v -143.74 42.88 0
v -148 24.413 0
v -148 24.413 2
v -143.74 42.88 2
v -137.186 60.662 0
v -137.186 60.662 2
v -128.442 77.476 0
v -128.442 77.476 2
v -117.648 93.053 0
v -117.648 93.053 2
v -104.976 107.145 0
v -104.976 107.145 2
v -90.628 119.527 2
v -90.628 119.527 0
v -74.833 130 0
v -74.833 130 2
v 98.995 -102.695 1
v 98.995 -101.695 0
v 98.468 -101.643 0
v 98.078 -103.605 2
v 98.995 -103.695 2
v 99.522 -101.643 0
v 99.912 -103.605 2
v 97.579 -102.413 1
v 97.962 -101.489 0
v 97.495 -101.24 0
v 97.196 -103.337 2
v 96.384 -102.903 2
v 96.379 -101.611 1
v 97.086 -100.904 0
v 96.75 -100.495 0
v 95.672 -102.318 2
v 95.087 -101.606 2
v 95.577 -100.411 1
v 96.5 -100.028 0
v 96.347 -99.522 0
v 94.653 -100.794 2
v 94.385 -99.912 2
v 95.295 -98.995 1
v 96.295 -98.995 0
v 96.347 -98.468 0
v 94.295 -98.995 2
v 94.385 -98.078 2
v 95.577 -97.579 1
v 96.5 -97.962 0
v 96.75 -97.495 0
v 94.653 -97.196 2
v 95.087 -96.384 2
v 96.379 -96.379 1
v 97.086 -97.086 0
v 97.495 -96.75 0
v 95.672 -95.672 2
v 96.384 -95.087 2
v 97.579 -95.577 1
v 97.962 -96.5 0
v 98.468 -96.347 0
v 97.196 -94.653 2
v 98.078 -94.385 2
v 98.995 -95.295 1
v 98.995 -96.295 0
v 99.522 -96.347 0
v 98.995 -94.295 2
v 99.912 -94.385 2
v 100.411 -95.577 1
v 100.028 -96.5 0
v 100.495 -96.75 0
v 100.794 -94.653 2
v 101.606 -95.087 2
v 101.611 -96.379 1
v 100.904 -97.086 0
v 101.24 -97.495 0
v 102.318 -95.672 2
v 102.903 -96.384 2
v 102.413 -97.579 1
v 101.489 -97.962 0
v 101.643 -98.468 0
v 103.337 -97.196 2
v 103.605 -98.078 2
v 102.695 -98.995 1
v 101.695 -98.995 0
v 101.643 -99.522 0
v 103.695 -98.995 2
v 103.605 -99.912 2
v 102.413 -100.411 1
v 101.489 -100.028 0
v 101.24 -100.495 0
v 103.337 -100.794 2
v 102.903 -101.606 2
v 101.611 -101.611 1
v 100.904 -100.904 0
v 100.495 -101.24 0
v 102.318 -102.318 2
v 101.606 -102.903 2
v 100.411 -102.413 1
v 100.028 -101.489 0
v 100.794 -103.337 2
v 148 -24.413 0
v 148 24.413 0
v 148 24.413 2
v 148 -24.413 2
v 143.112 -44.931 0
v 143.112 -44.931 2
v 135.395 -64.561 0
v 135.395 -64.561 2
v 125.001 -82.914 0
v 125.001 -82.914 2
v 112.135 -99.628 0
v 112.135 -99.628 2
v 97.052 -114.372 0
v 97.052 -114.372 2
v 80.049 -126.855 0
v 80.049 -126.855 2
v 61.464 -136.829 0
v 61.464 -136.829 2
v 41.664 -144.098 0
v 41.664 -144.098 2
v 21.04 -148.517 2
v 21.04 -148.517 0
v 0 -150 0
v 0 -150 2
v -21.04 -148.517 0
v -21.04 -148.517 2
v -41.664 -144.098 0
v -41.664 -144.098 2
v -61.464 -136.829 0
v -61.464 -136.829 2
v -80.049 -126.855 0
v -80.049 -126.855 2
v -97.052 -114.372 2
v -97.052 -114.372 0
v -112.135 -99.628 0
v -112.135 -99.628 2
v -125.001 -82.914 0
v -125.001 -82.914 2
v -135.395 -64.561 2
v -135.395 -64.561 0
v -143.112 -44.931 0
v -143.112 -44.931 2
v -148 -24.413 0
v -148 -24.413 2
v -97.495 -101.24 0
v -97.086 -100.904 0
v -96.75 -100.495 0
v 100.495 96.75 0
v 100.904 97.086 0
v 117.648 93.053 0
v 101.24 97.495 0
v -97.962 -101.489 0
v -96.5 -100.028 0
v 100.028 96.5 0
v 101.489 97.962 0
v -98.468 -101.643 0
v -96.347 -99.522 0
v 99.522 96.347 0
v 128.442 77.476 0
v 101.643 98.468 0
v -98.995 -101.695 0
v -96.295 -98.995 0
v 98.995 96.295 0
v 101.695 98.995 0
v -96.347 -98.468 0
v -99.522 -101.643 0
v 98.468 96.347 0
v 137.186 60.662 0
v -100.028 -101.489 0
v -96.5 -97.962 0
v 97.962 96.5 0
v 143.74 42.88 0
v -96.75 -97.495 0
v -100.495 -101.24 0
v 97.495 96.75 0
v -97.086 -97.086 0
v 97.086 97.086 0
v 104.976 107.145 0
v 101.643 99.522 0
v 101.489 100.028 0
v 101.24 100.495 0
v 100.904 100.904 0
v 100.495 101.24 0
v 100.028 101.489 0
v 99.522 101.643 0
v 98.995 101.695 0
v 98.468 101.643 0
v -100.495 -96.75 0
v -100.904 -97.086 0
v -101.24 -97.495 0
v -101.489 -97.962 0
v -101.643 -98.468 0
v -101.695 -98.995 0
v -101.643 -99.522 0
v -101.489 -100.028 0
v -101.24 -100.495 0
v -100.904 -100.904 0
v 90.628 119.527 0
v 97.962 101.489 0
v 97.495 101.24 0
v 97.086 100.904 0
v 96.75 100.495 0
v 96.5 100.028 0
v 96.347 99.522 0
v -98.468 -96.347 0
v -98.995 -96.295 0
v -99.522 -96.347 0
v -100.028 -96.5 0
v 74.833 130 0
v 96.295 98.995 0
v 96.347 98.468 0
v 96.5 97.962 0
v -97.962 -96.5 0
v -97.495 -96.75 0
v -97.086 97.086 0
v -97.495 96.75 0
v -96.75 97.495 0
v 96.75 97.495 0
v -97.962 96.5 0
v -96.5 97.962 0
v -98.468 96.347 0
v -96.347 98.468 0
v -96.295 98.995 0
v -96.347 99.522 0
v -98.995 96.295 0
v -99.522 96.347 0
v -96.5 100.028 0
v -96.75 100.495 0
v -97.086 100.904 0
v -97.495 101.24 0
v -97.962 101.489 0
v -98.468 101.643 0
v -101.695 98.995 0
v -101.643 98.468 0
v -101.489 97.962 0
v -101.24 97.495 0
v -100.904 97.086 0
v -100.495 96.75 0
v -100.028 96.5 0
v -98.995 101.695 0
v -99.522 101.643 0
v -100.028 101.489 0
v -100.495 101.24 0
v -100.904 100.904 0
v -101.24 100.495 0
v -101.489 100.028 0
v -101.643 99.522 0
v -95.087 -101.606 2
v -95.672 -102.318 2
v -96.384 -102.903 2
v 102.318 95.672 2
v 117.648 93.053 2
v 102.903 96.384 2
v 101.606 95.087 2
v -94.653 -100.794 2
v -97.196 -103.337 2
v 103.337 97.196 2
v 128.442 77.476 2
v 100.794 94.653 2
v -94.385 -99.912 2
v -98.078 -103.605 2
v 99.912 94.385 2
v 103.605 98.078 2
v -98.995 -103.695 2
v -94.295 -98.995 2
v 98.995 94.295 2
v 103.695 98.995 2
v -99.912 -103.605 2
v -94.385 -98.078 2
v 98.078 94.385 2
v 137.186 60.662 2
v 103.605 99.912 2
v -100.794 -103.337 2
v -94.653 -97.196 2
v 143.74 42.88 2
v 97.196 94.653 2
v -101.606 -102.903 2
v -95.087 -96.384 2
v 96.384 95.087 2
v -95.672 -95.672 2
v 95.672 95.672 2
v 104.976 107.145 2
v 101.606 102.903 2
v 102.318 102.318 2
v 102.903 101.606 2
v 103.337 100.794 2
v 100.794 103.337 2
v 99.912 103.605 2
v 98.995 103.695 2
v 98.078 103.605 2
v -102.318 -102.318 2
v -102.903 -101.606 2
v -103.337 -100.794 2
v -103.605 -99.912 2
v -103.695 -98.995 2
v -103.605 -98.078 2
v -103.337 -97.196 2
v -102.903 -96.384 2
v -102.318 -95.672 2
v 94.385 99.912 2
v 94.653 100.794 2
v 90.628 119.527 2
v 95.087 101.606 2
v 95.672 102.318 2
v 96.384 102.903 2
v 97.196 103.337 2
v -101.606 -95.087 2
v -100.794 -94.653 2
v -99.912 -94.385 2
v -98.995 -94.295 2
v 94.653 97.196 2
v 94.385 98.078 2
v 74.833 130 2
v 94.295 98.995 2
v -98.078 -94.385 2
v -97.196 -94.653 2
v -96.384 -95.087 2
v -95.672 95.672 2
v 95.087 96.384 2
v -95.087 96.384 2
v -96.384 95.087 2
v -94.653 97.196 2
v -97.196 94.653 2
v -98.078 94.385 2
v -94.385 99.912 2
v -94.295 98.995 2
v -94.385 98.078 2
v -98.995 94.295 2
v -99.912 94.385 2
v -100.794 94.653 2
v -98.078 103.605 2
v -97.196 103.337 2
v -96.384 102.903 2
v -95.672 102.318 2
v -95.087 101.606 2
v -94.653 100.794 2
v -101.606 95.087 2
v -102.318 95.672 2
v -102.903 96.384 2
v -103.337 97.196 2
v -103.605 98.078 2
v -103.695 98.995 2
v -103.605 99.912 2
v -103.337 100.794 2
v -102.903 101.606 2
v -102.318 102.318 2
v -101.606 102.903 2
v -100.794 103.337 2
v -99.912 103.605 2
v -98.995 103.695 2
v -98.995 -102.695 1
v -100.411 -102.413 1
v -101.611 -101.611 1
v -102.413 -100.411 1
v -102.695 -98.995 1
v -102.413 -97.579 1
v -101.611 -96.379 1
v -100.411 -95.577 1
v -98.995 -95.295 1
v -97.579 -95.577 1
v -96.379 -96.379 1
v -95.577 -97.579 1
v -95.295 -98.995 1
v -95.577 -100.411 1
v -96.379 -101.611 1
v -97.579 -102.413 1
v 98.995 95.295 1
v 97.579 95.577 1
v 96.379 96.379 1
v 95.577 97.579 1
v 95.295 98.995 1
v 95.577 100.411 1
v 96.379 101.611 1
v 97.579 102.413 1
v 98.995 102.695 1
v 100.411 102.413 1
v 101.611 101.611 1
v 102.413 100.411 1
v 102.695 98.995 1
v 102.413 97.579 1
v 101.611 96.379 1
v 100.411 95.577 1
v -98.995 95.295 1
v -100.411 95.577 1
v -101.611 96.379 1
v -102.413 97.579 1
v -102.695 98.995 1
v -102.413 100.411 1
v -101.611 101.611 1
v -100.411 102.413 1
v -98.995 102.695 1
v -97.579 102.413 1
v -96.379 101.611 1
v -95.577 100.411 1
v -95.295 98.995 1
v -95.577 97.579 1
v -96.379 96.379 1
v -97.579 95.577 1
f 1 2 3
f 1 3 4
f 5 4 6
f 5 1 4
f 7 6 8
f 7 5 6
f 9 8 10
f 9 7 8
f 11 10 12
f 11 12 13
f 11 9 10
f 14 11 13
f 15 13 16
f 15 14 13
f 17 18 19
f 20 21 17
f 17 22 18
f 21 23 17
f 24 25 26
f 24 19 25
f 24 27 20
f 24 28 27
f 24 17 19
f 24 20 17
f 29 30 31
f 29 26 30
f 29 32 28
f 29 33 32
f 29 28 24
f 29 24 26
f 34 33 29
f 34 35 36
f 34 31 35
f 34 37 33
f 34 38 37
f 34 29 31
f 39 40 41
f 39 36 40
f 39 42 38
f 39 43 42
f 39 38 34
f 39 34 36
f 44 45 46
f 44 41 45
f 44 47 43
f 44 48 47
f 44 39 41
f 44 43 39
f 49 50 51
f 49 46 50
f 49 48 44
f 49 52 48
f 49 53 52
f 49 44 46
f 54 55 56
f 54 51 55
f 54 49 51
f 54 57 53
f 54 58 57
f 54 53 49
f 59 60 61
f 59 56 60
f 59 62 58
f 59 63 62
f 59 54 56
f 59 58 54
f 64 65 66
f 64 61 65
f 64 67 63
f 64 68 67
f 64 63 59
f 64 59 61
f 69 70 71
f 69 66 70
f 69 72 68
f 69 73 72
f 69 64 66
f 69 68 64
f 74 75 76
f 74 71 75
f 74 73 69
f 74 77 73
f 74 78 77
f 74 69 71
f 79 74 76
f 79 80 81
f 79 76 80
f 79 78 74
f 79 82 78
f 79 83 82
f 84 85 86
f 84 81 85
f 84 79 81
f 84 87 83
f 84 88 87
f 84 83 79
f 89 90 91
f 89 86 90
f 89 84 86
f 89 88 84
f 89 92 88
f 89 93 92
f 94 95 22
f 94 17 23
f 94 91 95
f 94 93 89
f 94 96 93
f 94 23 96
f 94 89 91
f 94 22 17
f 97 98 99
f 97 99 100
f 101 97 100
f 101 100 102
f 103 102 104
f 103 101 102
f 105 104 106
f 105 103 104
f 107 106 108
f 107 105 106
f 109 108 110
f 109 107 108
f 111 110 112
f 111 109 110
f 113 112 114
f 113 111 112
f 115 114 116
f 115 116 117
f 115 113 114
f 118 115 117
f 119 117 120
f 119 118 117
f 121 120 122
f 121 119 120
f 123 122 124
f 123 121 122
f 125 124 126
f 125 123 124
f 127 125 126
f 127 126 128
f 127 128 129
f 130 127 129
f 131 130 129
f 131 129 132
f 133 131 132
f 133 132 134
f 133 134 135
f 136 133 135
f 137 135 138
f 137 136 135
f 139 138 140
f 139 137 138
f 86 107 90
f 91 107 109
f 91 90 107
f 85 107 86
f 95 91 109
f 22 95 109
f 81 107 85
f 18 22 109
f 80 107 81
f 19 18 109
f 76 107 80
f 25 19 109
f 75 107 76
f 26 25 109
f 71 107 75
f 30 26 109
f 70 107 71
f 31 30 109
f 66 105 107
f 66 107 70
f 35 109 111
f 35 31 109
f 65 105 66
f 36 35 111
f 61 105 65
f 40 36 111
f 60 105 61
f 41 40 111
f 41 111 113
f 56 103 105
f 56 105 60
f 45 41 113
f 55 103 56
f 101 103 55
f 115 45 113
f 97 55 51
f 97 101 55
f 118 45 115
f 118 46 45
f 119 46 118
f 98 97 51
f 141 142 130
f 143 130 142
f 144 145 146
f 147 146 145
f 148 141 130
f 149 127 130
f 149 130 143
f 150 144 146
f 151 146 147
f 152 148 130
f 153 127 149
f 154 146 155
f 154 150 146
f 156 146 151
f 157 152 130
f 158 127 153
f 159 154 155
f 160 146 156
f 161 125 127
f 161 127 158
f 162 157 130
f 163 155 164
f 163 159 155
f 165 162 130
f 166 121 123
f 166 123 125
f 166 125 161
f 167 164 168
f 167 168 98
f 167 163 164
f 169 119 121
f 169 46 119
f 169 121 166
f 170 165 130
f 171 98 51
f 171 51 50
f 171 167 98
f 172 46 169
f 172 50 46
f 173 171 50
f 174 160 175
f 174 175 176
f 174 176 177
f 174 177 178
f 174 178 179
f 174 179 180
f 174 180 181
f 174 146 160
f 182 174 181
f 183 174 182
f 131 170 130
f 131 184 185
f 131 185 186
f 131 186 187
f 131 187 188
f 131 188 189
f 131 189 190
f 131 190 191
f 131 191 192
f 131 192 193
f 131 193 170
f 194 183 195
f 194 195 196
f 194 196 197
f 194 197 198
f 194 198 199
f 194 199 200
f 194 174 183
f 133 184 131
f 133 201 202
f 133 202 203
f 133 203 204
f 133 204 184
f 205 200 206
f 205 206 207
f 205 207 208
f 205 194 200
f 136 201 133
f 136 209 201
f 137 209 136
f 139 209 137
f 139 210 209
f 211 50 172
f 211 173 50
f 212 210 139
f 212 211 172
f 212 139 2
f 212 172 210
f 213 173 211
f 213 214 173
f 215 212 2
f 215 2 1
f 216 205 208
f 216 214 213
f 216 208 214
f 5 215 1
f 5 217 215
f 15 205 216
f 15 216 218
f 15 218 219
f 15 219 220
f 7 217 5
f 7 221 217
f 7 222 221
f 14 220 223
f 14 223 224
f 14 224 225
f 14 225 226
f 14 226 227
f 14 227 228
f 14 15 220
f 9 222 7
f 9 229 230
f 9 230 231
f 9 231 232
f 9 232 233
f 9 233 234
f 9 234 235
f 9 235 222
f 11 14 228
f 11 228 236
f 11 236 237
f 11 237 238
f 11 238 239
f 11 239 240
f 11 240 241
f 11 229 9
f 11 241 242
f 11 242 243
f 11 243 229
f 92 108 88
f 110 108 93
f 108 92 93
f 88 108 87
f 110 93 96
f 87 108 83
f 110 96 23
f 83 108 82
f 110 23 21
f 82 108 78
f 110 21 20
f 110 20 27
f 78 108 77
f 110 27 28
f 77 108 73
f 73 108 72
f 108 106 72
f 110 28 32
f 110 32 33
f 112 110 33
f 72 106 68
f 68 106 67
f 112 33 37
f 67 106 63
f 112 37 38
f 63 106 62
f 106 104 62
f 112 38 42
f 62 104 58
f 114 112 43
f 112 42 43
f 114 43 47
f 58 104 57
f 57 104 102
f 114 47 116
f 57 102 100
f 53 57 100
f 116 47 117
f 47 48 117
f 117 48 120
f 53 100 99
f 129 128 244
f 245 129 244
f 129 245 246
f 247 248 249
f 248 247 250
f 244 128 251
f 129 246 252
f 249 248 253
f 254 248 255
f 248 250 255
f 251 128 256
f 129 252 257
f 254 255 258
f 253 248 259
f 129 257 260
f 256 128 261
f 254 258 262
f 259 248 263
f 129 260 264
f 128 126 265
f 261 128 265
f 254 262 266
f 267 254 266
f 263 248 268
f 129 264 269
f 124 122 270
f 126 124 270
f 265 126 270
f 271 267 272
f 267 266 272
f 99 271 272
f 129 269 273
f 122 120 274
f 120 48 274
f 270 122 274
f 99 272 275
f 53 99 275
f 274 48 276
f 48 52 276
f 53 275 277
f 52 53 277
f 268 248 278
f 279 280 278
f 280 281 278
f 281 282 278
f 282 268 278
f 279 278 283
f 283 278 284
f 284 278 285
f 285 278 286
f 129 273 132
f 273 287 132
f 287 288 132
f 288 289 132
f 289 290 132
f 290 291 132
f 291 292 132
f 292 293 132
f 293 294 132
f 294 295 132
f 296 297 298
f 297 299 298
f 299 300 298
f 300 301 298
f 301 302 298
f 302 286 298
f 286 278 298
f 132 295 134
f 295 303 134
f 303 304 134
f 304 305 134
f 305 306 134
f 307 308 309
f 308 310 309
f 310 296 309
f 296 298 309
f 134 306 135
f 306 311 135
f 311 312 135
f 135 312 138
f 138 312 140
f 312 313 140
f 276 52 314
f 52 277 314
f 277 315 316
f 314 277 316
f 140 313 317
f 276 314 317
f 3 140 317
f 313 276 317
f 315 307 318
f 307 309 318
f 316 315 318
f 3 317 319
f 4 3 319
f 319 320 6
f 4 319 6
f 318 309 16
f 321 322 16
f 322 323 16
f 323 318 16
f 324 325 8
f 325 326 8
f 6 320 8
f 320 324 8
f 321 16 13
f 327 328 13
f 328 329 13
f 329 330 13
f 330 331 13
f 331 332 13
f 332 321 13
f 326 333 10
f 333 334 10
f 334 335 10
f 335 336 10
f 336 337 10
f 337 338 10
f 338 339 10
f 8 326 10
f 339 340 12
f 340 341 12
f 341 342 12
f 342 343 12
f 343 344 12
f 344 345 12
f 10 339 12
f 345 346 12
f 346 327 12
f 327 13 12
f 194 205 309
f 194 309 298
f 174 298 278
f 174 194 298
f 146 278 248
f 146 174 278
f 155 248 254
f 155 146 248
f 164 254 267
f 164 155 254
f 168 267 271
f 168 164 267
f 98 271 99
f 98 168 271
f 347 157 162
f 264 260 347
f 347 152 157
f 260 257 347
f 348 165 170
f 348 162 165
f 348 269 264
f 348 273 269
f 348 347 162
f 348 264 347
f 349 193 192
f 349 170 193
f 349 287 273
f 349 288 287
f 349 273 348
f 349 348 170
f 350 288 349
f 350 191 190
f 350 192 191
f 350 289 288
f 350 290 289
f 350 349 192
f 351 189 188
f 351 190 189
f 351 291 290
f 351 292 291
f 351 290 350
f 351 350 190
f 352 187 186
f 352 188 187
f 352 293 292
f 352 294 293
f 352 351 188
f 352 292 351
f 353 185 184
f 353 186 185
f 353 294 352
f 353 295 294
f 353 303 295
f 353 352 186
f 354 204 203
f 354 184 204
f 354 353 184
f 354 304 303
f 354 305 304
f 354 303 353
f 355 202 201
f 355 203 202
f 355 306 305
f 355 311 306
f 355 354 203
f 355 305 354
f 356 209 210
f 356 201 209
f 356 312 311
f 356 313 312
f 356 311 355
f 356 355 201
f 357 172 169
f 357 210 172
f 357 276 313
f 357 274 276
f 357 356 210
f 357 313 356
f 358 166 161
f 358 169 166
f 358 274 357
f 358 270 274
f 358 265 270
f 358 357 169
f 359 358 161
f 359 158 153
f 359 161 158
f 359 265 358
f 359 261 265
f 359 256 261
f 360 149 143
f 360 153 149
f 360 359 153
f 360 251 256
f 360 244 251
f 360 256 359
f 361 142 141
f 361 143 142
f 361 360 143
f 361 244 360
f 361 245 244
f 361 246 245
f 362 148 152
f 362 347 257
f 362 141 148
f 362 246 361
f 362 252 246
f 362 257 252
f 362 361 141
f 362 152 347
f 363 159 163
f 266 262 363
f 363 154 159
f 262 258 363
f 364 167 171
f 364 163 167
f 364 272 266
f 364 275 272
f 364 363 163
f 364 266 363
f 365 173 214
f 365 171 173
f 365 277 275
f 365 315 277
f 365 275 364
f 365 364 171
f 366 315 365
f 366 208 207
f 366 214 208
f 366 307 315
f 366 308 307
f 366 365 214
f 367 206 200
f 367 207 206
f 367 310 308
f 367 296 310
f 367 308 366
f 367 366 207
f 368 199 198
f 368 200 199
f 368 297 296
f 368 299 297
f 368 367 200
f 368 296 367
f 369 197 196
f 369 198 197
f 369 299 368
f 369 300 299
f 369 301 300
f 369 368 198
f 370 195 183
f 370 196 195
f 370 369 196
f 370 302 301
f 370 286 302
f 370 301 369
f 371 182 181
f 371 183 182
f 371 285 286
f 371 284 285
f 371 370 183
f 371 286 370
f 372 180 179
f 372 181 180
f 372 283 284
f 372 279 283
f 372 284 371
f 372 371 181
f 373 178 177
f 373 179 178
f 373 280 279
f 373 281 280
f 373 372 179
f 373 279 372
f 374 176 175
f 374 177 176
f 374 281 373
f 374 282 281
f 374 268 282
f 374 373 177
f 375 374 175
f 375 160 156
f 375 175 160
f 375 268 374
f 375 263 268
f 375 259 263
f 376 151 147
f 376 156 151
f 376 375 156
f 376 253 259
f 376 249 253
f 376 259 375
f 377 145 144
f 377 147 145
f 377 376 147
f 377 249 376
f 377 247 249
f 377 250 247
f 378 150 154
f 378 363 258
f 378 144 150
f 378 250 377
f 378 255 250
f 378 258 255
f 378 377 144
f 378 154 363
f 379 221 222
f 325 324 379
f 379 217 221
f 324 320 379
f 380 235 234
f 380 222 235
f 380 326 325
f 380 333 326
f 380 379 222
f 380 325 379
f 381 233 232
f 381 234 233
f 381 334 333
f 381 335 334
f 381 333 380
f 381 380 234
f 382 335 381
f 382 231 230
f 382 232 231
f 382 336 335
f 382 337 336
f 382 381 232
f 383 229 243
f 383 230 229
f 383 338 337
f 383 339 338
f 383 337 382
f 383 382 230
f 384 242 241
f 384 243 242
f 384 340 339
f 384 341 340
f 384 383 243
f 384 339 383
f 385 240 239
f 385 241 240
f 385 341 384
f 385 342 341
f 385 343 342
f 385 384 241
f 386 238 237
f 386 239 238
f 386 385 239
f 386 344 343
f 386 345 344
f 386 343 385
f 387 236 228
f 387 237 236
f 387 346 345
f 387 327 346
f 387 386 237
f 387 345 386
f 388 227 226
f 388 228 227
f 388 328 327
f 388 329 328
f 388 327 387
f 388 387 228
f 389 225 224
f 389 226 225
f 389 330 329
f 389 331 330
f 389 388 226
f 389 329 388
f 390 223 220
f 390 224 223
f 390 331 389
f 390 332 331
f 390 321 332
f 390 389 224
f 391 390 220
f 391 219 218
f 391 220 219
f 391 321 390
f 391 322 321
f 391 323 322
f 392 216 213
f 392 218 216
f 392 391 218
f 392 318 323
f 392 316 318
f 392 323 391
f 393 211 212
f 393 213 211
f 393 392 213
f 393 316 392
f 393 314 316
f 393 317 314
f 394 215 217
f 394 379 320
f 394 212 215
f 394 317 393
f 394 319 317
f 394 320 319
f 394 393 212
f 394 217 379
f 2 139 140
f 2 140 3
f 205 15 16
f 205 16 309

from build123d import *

# Parameters (mm, degrees)
ESQUISSE1_R                                 = 1.6
BOSS_EXTRU_1_DEPTH                          = 2
FRAISAGE_POUR_VIS_T_TE_FRAIS_E_M42_AT_COUNT = 2
FRAISAGE_POUR_VIS_T_TE_FRAIS_E_M42_AT_PITCH = 197.989898732
FRAISAGE_POUR_VIS_T_TE_FRAIS_E_M42_2_COUNT  = 2
FRAISAGE_POUR_VIS_T_TE_FRAIS_E_M42_2_PITCH  = 197.989898732
FRAISAGE_POUR_VIS_T_TE_FRAIS_E_M42_3_COUNT  = 2
FRAISAGE_POUR_VIS_T_TE_FRAIS_E_M42_3_PITCH  = 280


with BuildPart() as part:
    # Esquisse1 → Boss.-Extru.1 (new body)
    with BuildSketch(Plane.XY):
        with BuildLine():
            Line((-74.833147735, 130), (74.833147735, 130))
            ThreePointArc((74.833147735, 130), (123.291527294, 85.435351568), (148, 24.413111231))
            Line((148, 24.413111231), (148, -24.413111231))
            ThreePointArc((148, -24.413111231), (0, -150), (-148, -24.413111231))
            Line((-148, -24.413111231), (-148, 24.413111231))
            ThreePointArc((-148, 24.413111231), (-123.291527294, 85.435351568), (-74.833147735, 130))
        make_face()
        with Locations((-98.994949366, 98.994949366)):
            Circle(ESQUISSE1_R, mode=Mode.SUBTRACT)
        with Locations((-98.994949366, -98.994949366)):
            Circle(ESQUISSE1_R, mode=Mode.SUBTRACT)
        with Locations((98.994949366, -98.994949366)):
            Circle(ESQUISSE1_R, mode=Mode.SUBTRACT)
        with Locations((98.994949366, 98.994949366)):
            Circle(ESQUISSE1_R, mode=Mode.SUBTRACT)
    extrude(amount=BOSS_EXTRU_1_DEPTH)

    # Esquisse4 → Fraisage pour vis à tête fraisée M42 (revolve, cut)
    with BuildSketch(Plane(origin=(98.994949366, 98.994949366, 2), x_dir=(0, -1, 0), z_dir=(1, 0, 0))):
        Polygon((0, 0), (0, 2), (2.25, 2), (2.25, 2.45), (4.7, 0), align=None)
    fraisage_pour_vis_t_te_frais_e_m42 = revolve(axis=Axis((98.994949366, 98.994949366, 8.35), (0, 0, -1)), mode=Mode.SUBTRACT)

    # Fraisage pour vis à tête fraisée M42 at: Fraisage pour vis à tête fraisée M42 ×2
    with Locations(*[(-i * FRAISAGE_POUR_VIS_T_TE_FRAIS_E_M42_AT_PITCH, 0, 0) for i in range(1, FRAISAGE_POUR_VIS_T_TE_FRAIS_E_M42_AT_COUNT)]):
        add(fraisage_pour_vis_t_te_frais_e_m42, mode=Mode.SUBTRACT)

    # Fraisage pour vis _ t_te frais_e M42 2: Fraisage pour vis à tête fraisée M42 ×2
    with Locations(*[(0, -i * FRAISAGE_POUR_VIS_T_TE_FRAIS_E_M42_2_PITCH, 0) for i in range(1, FRAISAGE_POUR_VIS_T_TE_FRAIS_E_M42_2_COUNT)]):
        add(fraisage_pour_vis_t_te_frais_e_m42, mode=Mode.SUBTRACT)

    # Fraisage pour vis _ t_te frais_e M42 3: Fraisage pour vis à tête fraisée M42 ×2
    with Locations(*[Vector(-0.707106781186546, -0.707106781186549, 0) * (i * FRAISAGE_POUR_VIS_T_TE_FRAIS_E_M42_3_PITCH) for i in range(1, FRAISAGE_POUR_VIS_T_TE_FRAIS_E_M42_3_COUNT)]):
        add(fraisage_pour_vis_t_te_frais_e_m42, mode=Mode.SUBTRACT)


solid = part.part
